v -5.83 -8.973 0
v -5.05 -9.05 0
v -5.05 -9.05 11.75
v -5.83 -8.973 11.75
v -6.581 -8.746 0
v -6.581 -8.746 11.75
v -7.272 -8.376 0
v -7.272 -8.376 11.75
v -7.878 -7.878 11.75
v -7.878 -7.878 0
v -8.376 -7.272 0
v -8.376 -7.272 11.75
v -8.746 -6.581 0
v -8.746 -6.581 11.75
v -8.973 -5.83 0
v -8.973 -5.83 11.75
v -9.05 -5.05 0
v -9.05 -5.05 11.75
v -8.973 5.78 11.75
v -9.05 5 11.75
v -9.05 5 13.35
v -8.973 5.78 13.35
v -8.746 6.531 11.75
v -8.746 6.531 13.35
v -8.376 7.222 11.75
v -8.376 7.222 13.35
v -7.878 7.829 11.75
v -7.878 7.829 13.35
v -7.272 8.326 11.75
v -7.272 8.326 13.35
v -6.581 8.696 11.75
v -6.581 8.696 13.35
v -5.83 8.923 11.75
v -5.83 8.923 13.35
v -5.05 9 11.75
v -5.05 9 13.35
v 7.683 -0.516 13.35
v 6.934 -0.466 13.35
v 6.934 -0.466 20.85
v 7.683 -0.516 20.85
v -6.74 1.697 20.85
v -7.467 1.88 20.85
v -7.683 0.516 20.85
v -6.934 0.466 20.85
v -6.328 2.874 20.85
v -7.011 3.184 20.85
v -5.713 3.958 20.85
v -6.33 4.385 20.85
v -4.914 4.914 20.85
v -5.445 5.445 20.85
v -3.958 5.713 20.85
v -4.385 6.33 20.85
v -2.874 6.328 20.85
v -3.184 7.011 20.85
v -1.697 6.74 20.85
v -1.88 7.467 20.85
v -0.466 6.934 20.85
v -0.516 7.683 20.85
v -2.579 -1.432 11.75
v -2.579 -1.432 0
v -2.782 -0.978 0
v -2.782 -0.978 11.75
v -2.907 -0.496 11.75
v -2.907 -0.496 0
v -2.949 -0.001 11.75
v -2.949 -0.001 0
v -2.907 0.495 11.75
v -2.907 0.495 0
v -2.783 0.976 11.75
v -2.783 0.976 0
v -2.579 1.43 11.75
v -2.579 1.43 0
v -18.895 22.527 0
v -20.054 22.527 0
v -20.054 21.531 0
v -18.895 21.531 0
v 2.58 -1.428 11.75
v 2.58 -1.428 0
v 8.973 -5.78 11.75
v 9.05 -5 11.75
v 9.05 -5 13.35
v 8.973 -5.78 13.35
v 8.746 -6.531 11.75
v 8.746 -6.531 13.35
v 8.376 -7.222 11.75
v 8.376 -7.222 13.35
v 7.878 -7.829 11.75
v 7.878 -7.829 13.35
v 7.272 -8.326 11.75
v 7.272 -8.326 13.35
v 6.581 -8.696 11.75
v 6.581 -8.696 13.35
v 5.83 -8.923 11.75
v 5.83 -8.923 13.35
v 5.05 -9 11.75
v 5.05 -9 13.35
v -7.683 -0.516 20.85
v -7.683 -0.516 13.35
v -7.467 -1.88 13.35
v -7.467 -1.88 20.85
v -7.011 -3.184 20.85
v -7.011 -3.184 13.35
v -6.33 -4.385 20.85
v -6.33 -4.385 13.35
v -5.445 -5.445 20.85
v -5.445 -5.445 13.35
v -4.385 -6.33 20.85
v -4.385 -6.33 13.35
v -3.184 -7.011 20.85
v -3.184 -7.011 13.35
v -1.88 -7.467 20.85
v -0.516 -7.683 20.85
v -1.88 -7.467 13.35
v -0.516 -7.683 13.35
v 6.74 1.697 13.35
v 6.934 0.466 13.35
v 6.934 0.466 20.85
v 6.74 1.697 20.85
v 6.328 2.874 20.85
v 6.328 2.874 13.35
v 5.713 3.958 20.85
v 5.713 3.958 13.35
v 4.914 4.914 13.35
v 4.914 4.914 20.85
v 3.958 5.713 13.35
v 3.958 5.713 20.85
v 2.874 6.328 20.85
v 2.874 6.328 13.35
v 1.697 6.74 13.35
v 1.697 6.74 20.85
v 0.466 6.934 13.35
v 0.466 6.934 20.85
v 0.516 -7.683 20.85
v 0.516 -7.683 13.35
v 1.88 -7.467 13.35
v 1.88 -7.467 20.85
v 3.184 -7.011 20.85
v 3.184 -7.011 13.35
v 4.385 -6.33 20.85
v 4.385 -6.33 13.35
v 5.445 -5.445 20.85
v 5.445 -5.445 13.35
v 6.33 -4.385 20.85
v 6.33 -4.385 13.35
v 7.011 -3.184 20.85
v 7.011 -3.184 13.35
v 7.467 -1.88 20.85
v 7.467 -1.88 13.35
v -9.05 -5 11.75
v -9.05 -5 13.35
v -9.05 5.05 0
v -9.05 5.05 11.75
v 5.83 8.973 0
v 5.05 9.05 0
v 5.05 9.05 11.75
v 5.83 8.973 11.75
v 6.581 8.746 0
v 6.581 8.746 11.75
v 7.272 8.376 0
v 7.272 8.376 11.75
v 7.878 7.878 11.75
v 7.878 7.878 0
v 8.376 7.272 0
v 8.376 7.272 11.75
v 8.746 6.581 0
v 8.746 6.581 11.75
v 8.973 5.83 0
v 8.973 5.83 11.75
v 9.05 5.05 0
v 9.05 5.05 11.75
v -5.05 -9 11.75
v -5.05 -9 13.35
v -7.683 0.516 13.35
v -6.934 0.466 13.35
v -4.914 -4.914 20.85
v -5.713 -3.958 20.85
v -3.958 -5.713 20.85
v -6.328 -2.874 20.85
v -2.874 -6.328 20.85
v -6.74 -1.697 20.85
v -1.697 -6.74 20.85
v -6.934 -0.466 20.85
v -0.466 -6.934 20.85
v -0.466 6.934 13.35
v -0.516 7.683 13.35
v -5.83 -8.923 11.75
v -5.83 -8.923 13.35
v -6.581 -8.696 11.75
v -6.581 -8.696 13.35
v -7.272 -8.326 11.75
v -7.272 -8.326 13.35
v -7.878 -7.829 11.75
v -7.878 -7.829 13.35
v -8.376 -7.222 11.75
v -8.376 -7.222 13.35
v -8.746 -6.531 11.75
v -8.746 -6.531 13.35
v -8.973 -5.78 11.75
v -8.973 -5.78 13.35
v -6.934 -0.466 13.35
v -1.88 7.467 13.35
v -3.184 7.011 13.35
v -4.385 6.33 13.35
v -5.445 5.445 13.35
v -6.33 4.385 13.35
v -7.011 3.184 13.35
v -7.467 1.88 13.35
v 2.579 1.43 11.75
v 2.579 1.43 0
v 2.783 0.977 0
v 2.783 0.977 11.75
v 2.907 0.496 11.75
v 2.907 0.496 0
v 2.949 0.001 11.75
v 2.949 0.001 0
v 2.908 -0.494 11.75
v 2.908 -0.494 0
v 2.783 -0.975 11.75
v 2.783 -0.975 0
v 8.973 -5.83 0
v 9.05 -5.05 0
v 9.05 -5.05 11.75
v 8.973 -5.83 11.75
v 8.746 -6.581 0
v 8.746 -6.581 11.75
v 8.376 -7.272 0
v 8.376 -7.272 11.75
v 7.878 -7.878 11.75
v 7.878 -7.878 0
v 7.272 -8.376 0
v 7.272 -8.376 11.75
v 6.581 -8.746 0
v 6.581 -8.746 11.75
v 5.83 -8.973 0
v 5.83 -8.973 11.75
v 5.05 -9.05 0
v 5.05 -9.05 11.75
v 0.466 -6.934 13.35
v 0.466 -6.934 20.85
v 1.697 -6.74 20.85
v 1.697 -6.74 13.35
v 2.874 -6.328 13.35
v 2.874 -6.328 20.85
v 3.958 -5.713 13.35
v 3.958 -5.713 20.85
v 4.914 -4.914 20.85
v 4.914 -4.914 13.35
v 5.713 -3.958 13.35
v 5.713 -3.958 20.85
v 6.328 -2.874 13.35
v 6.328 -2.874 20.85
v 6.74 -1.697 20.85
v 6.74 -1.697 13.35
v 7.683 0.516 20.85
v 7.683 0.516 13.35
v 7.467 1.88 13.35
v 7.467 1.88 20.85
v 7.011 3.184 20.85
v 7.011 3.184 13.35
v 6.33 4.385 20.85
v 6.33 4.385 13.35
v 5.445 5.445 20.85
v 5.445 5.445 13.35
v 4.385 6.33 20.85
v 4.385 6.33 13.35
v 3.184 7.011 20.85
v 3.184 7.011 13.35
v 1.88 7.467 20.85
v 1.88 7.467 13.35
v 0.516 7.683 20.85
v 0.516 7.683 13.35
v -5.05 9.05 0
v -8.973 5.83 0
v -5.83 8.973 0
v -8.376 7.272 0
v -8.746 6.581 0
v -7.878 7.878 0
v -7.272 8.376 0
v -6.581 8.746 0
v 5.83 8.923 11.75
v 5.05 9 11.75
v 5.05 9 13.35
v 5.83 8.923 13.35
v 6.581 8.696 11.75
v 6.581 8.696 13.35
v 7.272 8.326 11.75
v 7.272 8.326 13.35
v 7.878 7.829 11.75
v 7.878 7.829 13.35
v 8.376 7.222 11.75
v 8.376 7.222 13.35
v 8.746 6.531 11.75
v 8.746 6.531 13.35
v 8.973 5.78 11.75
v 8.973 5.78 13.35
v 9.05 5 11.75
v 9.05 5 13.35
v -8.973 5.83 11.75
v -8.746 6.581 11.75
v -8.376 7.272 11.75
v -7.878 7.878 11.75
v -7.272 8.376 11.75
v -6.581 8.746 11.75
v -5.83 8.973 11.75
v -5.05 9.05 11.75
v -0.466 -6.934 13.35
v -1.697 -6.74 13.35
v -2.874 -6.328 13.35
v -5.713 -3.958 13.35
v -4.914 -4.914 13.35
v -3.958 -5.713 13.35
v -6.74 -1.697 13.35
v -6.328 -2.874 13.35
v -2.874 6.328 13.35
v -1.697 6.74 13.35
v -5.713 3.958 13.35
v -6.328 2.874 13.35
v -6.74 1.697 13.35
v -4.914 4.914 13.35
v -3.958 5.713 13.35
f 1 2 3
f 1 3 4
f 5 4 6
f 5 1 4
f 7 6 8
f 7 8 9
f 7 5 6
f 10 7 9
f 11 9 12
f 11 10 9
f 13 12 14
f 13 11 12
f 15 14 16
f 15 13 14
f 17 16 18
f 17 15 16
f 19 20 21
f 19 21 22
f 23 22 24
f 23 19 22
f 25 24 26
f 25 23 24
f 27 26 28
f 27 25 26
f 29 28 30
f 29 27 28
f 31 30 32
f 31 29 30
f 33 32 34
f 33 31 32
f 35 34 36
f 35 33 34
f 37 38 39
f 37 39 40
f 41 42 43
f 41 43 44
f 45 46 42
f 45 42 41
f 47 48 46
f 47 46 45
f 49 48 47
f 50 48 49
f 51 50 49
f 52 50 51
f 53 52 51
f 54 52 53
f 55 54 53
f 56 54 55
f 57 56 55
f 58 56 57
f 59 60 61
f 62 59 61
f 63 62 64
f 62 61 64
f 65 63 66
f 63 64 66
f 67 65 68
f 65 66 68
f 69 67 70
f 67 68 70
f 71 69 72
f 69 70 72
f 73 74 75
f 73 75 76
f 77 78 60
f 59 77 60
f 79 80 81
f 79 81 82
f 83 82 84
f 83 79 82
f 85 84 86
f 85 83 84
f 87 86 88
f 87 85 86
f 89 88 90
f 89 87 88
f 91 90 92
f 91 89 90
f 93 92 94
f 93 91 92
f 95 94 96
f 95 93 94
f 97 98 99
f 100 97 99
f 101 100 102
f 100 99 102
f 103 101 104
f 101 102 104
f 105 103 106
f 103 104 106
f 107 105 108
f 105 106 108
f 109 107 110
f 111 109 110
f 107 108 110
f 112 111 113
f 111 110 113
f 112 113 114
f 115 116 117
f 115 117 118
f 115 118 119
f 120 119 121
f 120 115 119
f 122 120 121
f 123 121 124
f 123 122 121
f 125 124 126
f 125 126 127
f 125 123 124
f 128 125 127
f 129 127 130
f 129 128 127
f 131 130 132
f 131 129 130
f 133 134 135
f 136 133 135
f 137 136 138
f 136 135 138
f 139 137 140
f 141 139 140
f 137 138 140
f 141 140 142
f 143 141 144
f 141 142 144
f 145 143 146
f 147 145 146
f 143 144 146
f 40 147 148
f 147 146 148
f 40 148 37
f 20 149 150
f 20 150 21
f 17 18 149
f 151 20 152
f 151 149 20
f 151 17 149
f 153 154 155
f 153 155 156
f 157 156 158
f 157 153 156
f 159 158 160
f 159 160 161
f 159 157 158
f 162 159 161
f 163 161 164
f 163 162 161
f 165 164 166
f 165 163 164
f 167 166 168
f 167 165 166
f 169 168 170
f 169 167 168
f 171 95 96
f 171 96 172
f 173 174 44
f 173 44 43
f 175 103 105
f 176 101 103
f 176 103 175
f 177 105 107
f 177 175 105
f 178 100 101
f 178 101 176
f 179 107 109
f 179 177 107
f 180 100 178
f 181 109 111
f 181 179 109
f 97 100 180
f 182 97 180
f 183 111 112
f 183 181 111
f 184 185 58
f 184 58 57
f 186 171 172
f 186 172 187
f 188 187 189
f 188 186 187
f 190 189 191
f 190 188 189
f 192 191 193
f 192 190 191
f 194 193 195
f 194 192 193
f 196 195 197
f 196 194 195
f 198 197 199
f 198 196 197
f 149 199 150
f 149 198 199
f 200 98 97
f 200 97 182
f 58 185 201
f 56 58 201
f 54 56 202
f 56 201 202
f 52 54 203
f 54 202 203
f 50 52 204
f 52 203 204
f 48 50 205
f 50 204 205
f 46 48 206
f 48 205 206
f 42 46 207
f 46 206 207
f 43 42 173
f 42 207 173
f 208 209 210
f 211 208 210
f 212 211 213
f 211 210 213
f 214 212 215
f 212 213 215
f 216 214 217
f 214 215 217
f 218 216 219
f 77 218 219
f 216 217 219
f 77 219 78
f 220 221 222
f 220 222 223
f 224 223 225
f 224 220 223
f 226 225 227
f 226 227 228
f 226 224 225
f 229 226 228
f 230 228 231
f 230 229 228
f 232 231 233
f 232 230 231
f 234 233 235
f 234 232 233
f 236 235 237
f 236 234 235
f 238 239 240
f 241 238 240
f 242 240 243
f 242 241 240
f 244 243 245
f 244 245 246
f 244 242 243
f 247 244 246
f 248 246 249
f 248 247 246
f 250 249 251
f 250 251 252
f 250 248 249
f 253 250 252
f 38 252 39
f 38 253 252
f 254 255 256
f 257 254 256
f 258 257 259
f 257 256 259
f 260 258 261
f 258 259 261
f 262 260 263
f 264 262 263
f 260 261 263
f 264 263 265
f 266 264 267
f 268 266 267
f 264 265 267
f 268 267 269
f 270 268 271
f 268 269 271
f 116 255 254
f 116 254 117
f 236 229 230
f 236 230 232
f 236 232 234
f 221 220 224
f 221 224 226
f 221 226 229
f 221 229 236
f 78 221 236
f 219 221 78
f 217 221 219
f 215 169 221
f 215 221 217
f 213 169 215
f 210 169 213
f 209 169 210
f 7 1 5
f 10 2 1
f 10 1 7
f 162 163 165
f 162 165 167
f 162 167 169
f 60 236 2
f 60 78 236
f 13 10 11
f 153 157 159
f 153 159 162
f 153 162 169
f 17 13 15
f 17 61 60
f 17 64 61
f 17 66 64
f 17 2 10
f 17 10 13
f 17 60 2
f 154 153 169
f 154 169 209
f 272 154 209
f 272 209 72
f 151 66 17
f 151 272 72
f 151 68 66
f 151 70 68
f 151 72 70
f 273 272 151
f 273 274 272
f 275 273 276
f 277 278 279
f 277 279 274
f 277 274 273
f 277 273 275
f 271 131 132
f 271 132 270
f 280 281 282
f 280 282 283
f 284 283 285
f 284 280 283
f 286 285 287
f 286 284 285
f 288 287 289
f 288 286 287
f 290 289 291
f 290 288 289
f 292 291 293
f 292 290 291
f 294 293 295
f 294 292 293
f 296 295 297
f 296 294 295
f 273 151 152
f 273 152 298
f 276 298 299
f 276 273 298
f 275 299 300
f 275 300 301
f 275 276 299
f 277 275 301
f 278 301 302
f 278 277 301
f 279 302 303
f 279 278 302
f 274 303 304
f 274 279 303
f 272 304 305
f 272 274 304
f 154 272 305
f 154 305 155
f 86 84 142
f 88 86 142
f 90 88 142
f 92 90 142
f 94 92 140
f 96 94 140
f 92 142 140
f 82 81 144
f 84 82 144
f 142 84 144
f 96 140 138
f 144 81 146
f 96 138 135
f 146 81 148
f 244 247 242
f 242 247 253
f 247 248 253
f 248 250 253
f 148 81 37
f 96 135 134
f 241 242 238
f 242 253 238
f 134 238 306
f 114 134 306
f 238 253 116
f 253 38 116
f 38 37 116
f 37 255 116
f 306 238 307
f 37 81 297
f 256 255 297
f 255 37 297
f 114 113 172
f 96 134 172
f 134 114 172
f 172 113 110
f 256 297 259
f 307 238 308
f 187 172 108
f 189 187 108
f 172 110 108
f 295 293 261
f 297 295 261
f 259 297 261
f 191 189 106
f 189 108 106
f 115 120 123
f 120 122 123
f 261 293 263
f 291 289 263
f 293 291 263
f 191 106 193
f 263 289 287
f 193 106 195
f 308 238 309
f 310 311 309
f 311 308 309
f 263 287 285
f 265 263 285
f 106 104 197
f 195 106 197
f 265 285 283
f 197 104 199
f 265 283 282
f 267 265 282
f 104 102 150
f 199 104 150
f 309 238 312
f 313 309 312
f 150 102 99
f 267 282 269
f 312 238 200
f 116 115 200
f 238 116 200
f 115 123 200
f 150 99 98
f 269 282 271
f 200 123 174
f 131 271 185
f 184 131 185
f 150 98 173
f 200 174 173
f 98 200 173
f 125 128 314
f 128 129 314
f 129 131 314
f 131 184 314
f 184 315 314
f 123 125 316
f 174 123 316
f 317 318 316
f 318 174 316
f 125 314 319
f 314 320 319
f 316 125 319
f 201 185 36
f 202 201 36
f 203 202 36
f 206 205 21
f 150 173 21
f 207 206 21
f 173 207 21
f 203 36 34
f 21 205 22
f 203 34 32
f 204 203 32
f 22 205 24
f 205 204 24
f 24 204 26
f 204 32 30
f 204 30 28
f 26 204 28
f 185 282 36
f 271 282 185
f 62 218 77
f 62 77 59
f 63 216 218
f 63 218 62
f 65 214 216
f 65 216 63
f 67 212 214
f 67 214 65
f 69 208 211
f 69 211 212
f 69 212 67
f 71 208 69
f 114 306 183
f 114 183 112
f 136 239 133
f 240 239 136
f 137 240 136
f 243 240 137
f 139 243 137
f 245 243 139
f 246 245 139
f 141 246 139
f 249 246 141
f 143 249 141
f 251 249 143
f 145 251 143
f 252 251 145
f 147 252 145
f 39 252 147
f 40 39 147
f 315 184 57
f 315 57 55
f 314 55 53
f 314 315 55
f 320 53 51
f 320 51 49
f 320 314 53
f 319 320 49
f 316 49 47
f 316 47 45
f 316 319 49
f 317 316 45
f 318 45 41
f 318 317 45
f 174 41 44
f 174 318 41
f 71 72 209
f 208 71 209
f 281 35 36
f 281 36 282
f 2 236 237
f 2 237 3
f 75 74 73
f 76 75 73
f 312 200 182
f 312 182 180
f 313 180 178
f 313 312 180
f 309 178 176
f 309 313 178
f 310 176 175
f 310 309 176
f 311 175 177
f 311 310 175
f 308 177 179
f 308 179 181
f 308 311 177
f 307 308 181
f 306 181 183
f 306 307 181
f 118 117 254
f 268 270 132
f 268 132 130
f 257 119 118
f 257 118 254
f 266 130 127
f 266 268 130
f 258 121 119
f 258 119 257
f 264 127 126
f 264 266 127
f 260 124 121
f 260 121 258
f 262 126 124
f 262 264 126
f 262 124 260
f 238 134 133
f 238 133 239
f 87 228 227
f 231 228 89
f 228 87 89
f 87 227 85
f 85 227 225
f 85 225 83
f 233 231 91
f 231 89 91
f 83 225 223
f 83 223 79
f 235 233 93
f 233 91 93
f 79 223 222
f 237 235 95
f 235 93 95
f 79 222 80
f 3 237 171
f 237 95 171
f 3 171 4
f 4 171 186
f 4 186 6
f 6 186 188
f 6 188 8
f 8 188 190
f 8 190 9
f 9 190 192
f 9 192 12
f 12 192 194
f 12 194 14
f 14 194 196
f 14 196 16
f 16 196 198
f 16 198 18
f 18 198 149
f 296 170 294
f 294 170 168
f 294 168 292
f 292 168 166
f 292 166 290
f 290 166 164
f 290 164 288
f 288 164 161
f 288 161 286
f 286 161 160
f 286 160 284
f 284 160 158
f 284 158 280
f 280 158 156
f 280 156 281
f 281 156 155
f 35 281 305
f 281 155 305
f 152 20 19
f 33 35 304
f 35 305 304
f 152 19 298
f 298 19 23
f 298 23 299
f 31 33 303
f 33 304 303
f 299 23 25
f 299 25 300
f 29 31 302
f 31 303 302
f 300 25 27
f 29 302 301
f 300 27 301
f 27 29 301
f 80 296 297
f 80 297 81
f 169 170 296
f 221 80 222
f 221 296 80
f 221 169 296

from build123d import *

# Parameters (mm, degrees)
SKETCH1_W           = 1.158652837
SKETCH1_H           = 0.996663238
BOSS_EXTRUDE1_DEPTH = 0.0005
BOSS_EXTRUDE2_DEPTH = 11.74993
BOSS_EXTRUDE3_DEPTH = 1.6
SKETCH4_R           = 7.7
BOSS_EXTRUDE4_DEPTH = 7.5
SKETCH5_R           = 6.95
CUT_EXTRUDE1_DEPTH  = 7.5
CUT_EXTRUDE2_DEPTH  = 7.5
CIRPATTERN1_COUNT   = 4


with BuildPart() as part:
    # Sketch1 → Boss-Extrude1 (new body)
    with BuildSketch(Plane.XY):
        with Locations((-19.474752995, 22.028941101)):
            Rectangle(SKETCH1_W, SKETCH1_H)
    extrude(amount=BOSS_EXTRUDE1_DEPTH)


with BuildPart() as body_2:
    # Sketch2 → Boss-Extrude2 (new body)
    with BuildSketch(Plane.XY):
        with BuildLine():
            Line((-5.05, 9.05), (5.05, 9.05))
            ThreePointArc((5.05, 9.05), (7.878427125, 7.878427125), (9.05, 5.05))
            Line((9.05, 5.05), (9.05, -5.05))
            ThreePointArc((9.05, -5.05), (7.878427125, -7.878427125), (5.05, -9.05))
            Line((5.05, -9.05), (-5.05, -9.05))
            ThreePointArc((-5.05, -9.05), (-7.878427125, -7.878427125), (-9.05, -5.05))
            Line((-9.05, -5.05), (-9.05, 5.05))
            ThreePointArc((-9.05, 5.05), (-7.878427125, 7.878427125), (-5.05, 9.05))
        make_face()
        with BuildLine():
            Line((-2.579374981, 1.43), (2.579374981, 1.43))
            ThreePointArc((2.579374981, 1.43), (2.949249821, 0.000883851), (2.580231621, -1.428453735))
            Line((2.580231621, -1.428453735), (-2.578517414, -1.431545751))
            ThreePointArc((-2.578517414, -1.431545751), (-2.949249821, -0.000883851), (-2.579374981, 1.43))
        make_face(mode=Mode.SUBTRACT)
    extrude(amount=BOSS_EXTRUDE2_DEPTH)

    # Sketch3 → Boss-Extrude3 (add)
    with BuildSketch(Plane.XY.offset(11.74993)):
        with BuildLine():
            Line((-5.05, 9.000108401), (5.05, 9.000108401))
            ThreePointArc((5.05, 9.000108401), (7.878427125, 7.828535526), (9.05, 5.000108401))
            Line((9.05, 5.000108401), (9.05, -5.000108401))
            ThreePointArc((9.05, -5.000108401), (7.878427125, -7.828535526), (5.05, -9.000108401))
            Line((5.05, -9.000108401), (-5.05, -9.000108401))
            ThreePointArc((-5.05, -9.000108401), (-7.878427125, -7.828535526), (-9.05, -5.000108401))
            Line((-9.05, -5.000108401), (-9.05, 5.000108401))
            ThreePointArc((-9.05, 5.000108401), (-7.878427125, 7.828535526), (-5.05, 9.000108401))
        make_face()
    extrude(amount=BOSS_EXTRUDE3_DEPTH)

    # Sketch4 → Boss-Extrude4 (add)
    with BuildSketch(Plane.XY.offset(13.34993)):
        Circle(SKETCH4_R)
    extrude(amount=BOSS_EXTRUDE4_DEPTH)

    # Sketch5 → Cut-Extrude1 (cut)
    with BuildSketch(Plane.XY.offset(13.34993)):
        Circle(SKETCH5_R)
    extrude(amount=CUT_EXTRUDE1_DEPTH, mode=Mode.SUBTRACT)

    # Sketch11 → Cut-Extrude2 (cut)
    with BuildSketch(Plane.XY.offset(13.34993)):
        Polygon((0, 8.183776361), (-0.55, 8.183776361), (0, 0), (0.55, 8.183776361), align=None)
    cut_extrude2 = extrude(amount=CUT_EXTRUDE2_DEPTH, mode=Mode.SUBTRACT)

    # CirPattern1: Cut-Extrude2 ×4 about axis
    cirpattern1_axis = Axis((0, 0, 20.84993), (0, 0, -1))
    for i in range(1, CIRPATTERN1_COUNT):
        add(cut_extrude2.rotate(cirpattern1_axis, i * 360 / CIRPATTERN1_COUNT), mode=Mode.SUBTRACT)


solid = Compound([part.part, body_2.part])
